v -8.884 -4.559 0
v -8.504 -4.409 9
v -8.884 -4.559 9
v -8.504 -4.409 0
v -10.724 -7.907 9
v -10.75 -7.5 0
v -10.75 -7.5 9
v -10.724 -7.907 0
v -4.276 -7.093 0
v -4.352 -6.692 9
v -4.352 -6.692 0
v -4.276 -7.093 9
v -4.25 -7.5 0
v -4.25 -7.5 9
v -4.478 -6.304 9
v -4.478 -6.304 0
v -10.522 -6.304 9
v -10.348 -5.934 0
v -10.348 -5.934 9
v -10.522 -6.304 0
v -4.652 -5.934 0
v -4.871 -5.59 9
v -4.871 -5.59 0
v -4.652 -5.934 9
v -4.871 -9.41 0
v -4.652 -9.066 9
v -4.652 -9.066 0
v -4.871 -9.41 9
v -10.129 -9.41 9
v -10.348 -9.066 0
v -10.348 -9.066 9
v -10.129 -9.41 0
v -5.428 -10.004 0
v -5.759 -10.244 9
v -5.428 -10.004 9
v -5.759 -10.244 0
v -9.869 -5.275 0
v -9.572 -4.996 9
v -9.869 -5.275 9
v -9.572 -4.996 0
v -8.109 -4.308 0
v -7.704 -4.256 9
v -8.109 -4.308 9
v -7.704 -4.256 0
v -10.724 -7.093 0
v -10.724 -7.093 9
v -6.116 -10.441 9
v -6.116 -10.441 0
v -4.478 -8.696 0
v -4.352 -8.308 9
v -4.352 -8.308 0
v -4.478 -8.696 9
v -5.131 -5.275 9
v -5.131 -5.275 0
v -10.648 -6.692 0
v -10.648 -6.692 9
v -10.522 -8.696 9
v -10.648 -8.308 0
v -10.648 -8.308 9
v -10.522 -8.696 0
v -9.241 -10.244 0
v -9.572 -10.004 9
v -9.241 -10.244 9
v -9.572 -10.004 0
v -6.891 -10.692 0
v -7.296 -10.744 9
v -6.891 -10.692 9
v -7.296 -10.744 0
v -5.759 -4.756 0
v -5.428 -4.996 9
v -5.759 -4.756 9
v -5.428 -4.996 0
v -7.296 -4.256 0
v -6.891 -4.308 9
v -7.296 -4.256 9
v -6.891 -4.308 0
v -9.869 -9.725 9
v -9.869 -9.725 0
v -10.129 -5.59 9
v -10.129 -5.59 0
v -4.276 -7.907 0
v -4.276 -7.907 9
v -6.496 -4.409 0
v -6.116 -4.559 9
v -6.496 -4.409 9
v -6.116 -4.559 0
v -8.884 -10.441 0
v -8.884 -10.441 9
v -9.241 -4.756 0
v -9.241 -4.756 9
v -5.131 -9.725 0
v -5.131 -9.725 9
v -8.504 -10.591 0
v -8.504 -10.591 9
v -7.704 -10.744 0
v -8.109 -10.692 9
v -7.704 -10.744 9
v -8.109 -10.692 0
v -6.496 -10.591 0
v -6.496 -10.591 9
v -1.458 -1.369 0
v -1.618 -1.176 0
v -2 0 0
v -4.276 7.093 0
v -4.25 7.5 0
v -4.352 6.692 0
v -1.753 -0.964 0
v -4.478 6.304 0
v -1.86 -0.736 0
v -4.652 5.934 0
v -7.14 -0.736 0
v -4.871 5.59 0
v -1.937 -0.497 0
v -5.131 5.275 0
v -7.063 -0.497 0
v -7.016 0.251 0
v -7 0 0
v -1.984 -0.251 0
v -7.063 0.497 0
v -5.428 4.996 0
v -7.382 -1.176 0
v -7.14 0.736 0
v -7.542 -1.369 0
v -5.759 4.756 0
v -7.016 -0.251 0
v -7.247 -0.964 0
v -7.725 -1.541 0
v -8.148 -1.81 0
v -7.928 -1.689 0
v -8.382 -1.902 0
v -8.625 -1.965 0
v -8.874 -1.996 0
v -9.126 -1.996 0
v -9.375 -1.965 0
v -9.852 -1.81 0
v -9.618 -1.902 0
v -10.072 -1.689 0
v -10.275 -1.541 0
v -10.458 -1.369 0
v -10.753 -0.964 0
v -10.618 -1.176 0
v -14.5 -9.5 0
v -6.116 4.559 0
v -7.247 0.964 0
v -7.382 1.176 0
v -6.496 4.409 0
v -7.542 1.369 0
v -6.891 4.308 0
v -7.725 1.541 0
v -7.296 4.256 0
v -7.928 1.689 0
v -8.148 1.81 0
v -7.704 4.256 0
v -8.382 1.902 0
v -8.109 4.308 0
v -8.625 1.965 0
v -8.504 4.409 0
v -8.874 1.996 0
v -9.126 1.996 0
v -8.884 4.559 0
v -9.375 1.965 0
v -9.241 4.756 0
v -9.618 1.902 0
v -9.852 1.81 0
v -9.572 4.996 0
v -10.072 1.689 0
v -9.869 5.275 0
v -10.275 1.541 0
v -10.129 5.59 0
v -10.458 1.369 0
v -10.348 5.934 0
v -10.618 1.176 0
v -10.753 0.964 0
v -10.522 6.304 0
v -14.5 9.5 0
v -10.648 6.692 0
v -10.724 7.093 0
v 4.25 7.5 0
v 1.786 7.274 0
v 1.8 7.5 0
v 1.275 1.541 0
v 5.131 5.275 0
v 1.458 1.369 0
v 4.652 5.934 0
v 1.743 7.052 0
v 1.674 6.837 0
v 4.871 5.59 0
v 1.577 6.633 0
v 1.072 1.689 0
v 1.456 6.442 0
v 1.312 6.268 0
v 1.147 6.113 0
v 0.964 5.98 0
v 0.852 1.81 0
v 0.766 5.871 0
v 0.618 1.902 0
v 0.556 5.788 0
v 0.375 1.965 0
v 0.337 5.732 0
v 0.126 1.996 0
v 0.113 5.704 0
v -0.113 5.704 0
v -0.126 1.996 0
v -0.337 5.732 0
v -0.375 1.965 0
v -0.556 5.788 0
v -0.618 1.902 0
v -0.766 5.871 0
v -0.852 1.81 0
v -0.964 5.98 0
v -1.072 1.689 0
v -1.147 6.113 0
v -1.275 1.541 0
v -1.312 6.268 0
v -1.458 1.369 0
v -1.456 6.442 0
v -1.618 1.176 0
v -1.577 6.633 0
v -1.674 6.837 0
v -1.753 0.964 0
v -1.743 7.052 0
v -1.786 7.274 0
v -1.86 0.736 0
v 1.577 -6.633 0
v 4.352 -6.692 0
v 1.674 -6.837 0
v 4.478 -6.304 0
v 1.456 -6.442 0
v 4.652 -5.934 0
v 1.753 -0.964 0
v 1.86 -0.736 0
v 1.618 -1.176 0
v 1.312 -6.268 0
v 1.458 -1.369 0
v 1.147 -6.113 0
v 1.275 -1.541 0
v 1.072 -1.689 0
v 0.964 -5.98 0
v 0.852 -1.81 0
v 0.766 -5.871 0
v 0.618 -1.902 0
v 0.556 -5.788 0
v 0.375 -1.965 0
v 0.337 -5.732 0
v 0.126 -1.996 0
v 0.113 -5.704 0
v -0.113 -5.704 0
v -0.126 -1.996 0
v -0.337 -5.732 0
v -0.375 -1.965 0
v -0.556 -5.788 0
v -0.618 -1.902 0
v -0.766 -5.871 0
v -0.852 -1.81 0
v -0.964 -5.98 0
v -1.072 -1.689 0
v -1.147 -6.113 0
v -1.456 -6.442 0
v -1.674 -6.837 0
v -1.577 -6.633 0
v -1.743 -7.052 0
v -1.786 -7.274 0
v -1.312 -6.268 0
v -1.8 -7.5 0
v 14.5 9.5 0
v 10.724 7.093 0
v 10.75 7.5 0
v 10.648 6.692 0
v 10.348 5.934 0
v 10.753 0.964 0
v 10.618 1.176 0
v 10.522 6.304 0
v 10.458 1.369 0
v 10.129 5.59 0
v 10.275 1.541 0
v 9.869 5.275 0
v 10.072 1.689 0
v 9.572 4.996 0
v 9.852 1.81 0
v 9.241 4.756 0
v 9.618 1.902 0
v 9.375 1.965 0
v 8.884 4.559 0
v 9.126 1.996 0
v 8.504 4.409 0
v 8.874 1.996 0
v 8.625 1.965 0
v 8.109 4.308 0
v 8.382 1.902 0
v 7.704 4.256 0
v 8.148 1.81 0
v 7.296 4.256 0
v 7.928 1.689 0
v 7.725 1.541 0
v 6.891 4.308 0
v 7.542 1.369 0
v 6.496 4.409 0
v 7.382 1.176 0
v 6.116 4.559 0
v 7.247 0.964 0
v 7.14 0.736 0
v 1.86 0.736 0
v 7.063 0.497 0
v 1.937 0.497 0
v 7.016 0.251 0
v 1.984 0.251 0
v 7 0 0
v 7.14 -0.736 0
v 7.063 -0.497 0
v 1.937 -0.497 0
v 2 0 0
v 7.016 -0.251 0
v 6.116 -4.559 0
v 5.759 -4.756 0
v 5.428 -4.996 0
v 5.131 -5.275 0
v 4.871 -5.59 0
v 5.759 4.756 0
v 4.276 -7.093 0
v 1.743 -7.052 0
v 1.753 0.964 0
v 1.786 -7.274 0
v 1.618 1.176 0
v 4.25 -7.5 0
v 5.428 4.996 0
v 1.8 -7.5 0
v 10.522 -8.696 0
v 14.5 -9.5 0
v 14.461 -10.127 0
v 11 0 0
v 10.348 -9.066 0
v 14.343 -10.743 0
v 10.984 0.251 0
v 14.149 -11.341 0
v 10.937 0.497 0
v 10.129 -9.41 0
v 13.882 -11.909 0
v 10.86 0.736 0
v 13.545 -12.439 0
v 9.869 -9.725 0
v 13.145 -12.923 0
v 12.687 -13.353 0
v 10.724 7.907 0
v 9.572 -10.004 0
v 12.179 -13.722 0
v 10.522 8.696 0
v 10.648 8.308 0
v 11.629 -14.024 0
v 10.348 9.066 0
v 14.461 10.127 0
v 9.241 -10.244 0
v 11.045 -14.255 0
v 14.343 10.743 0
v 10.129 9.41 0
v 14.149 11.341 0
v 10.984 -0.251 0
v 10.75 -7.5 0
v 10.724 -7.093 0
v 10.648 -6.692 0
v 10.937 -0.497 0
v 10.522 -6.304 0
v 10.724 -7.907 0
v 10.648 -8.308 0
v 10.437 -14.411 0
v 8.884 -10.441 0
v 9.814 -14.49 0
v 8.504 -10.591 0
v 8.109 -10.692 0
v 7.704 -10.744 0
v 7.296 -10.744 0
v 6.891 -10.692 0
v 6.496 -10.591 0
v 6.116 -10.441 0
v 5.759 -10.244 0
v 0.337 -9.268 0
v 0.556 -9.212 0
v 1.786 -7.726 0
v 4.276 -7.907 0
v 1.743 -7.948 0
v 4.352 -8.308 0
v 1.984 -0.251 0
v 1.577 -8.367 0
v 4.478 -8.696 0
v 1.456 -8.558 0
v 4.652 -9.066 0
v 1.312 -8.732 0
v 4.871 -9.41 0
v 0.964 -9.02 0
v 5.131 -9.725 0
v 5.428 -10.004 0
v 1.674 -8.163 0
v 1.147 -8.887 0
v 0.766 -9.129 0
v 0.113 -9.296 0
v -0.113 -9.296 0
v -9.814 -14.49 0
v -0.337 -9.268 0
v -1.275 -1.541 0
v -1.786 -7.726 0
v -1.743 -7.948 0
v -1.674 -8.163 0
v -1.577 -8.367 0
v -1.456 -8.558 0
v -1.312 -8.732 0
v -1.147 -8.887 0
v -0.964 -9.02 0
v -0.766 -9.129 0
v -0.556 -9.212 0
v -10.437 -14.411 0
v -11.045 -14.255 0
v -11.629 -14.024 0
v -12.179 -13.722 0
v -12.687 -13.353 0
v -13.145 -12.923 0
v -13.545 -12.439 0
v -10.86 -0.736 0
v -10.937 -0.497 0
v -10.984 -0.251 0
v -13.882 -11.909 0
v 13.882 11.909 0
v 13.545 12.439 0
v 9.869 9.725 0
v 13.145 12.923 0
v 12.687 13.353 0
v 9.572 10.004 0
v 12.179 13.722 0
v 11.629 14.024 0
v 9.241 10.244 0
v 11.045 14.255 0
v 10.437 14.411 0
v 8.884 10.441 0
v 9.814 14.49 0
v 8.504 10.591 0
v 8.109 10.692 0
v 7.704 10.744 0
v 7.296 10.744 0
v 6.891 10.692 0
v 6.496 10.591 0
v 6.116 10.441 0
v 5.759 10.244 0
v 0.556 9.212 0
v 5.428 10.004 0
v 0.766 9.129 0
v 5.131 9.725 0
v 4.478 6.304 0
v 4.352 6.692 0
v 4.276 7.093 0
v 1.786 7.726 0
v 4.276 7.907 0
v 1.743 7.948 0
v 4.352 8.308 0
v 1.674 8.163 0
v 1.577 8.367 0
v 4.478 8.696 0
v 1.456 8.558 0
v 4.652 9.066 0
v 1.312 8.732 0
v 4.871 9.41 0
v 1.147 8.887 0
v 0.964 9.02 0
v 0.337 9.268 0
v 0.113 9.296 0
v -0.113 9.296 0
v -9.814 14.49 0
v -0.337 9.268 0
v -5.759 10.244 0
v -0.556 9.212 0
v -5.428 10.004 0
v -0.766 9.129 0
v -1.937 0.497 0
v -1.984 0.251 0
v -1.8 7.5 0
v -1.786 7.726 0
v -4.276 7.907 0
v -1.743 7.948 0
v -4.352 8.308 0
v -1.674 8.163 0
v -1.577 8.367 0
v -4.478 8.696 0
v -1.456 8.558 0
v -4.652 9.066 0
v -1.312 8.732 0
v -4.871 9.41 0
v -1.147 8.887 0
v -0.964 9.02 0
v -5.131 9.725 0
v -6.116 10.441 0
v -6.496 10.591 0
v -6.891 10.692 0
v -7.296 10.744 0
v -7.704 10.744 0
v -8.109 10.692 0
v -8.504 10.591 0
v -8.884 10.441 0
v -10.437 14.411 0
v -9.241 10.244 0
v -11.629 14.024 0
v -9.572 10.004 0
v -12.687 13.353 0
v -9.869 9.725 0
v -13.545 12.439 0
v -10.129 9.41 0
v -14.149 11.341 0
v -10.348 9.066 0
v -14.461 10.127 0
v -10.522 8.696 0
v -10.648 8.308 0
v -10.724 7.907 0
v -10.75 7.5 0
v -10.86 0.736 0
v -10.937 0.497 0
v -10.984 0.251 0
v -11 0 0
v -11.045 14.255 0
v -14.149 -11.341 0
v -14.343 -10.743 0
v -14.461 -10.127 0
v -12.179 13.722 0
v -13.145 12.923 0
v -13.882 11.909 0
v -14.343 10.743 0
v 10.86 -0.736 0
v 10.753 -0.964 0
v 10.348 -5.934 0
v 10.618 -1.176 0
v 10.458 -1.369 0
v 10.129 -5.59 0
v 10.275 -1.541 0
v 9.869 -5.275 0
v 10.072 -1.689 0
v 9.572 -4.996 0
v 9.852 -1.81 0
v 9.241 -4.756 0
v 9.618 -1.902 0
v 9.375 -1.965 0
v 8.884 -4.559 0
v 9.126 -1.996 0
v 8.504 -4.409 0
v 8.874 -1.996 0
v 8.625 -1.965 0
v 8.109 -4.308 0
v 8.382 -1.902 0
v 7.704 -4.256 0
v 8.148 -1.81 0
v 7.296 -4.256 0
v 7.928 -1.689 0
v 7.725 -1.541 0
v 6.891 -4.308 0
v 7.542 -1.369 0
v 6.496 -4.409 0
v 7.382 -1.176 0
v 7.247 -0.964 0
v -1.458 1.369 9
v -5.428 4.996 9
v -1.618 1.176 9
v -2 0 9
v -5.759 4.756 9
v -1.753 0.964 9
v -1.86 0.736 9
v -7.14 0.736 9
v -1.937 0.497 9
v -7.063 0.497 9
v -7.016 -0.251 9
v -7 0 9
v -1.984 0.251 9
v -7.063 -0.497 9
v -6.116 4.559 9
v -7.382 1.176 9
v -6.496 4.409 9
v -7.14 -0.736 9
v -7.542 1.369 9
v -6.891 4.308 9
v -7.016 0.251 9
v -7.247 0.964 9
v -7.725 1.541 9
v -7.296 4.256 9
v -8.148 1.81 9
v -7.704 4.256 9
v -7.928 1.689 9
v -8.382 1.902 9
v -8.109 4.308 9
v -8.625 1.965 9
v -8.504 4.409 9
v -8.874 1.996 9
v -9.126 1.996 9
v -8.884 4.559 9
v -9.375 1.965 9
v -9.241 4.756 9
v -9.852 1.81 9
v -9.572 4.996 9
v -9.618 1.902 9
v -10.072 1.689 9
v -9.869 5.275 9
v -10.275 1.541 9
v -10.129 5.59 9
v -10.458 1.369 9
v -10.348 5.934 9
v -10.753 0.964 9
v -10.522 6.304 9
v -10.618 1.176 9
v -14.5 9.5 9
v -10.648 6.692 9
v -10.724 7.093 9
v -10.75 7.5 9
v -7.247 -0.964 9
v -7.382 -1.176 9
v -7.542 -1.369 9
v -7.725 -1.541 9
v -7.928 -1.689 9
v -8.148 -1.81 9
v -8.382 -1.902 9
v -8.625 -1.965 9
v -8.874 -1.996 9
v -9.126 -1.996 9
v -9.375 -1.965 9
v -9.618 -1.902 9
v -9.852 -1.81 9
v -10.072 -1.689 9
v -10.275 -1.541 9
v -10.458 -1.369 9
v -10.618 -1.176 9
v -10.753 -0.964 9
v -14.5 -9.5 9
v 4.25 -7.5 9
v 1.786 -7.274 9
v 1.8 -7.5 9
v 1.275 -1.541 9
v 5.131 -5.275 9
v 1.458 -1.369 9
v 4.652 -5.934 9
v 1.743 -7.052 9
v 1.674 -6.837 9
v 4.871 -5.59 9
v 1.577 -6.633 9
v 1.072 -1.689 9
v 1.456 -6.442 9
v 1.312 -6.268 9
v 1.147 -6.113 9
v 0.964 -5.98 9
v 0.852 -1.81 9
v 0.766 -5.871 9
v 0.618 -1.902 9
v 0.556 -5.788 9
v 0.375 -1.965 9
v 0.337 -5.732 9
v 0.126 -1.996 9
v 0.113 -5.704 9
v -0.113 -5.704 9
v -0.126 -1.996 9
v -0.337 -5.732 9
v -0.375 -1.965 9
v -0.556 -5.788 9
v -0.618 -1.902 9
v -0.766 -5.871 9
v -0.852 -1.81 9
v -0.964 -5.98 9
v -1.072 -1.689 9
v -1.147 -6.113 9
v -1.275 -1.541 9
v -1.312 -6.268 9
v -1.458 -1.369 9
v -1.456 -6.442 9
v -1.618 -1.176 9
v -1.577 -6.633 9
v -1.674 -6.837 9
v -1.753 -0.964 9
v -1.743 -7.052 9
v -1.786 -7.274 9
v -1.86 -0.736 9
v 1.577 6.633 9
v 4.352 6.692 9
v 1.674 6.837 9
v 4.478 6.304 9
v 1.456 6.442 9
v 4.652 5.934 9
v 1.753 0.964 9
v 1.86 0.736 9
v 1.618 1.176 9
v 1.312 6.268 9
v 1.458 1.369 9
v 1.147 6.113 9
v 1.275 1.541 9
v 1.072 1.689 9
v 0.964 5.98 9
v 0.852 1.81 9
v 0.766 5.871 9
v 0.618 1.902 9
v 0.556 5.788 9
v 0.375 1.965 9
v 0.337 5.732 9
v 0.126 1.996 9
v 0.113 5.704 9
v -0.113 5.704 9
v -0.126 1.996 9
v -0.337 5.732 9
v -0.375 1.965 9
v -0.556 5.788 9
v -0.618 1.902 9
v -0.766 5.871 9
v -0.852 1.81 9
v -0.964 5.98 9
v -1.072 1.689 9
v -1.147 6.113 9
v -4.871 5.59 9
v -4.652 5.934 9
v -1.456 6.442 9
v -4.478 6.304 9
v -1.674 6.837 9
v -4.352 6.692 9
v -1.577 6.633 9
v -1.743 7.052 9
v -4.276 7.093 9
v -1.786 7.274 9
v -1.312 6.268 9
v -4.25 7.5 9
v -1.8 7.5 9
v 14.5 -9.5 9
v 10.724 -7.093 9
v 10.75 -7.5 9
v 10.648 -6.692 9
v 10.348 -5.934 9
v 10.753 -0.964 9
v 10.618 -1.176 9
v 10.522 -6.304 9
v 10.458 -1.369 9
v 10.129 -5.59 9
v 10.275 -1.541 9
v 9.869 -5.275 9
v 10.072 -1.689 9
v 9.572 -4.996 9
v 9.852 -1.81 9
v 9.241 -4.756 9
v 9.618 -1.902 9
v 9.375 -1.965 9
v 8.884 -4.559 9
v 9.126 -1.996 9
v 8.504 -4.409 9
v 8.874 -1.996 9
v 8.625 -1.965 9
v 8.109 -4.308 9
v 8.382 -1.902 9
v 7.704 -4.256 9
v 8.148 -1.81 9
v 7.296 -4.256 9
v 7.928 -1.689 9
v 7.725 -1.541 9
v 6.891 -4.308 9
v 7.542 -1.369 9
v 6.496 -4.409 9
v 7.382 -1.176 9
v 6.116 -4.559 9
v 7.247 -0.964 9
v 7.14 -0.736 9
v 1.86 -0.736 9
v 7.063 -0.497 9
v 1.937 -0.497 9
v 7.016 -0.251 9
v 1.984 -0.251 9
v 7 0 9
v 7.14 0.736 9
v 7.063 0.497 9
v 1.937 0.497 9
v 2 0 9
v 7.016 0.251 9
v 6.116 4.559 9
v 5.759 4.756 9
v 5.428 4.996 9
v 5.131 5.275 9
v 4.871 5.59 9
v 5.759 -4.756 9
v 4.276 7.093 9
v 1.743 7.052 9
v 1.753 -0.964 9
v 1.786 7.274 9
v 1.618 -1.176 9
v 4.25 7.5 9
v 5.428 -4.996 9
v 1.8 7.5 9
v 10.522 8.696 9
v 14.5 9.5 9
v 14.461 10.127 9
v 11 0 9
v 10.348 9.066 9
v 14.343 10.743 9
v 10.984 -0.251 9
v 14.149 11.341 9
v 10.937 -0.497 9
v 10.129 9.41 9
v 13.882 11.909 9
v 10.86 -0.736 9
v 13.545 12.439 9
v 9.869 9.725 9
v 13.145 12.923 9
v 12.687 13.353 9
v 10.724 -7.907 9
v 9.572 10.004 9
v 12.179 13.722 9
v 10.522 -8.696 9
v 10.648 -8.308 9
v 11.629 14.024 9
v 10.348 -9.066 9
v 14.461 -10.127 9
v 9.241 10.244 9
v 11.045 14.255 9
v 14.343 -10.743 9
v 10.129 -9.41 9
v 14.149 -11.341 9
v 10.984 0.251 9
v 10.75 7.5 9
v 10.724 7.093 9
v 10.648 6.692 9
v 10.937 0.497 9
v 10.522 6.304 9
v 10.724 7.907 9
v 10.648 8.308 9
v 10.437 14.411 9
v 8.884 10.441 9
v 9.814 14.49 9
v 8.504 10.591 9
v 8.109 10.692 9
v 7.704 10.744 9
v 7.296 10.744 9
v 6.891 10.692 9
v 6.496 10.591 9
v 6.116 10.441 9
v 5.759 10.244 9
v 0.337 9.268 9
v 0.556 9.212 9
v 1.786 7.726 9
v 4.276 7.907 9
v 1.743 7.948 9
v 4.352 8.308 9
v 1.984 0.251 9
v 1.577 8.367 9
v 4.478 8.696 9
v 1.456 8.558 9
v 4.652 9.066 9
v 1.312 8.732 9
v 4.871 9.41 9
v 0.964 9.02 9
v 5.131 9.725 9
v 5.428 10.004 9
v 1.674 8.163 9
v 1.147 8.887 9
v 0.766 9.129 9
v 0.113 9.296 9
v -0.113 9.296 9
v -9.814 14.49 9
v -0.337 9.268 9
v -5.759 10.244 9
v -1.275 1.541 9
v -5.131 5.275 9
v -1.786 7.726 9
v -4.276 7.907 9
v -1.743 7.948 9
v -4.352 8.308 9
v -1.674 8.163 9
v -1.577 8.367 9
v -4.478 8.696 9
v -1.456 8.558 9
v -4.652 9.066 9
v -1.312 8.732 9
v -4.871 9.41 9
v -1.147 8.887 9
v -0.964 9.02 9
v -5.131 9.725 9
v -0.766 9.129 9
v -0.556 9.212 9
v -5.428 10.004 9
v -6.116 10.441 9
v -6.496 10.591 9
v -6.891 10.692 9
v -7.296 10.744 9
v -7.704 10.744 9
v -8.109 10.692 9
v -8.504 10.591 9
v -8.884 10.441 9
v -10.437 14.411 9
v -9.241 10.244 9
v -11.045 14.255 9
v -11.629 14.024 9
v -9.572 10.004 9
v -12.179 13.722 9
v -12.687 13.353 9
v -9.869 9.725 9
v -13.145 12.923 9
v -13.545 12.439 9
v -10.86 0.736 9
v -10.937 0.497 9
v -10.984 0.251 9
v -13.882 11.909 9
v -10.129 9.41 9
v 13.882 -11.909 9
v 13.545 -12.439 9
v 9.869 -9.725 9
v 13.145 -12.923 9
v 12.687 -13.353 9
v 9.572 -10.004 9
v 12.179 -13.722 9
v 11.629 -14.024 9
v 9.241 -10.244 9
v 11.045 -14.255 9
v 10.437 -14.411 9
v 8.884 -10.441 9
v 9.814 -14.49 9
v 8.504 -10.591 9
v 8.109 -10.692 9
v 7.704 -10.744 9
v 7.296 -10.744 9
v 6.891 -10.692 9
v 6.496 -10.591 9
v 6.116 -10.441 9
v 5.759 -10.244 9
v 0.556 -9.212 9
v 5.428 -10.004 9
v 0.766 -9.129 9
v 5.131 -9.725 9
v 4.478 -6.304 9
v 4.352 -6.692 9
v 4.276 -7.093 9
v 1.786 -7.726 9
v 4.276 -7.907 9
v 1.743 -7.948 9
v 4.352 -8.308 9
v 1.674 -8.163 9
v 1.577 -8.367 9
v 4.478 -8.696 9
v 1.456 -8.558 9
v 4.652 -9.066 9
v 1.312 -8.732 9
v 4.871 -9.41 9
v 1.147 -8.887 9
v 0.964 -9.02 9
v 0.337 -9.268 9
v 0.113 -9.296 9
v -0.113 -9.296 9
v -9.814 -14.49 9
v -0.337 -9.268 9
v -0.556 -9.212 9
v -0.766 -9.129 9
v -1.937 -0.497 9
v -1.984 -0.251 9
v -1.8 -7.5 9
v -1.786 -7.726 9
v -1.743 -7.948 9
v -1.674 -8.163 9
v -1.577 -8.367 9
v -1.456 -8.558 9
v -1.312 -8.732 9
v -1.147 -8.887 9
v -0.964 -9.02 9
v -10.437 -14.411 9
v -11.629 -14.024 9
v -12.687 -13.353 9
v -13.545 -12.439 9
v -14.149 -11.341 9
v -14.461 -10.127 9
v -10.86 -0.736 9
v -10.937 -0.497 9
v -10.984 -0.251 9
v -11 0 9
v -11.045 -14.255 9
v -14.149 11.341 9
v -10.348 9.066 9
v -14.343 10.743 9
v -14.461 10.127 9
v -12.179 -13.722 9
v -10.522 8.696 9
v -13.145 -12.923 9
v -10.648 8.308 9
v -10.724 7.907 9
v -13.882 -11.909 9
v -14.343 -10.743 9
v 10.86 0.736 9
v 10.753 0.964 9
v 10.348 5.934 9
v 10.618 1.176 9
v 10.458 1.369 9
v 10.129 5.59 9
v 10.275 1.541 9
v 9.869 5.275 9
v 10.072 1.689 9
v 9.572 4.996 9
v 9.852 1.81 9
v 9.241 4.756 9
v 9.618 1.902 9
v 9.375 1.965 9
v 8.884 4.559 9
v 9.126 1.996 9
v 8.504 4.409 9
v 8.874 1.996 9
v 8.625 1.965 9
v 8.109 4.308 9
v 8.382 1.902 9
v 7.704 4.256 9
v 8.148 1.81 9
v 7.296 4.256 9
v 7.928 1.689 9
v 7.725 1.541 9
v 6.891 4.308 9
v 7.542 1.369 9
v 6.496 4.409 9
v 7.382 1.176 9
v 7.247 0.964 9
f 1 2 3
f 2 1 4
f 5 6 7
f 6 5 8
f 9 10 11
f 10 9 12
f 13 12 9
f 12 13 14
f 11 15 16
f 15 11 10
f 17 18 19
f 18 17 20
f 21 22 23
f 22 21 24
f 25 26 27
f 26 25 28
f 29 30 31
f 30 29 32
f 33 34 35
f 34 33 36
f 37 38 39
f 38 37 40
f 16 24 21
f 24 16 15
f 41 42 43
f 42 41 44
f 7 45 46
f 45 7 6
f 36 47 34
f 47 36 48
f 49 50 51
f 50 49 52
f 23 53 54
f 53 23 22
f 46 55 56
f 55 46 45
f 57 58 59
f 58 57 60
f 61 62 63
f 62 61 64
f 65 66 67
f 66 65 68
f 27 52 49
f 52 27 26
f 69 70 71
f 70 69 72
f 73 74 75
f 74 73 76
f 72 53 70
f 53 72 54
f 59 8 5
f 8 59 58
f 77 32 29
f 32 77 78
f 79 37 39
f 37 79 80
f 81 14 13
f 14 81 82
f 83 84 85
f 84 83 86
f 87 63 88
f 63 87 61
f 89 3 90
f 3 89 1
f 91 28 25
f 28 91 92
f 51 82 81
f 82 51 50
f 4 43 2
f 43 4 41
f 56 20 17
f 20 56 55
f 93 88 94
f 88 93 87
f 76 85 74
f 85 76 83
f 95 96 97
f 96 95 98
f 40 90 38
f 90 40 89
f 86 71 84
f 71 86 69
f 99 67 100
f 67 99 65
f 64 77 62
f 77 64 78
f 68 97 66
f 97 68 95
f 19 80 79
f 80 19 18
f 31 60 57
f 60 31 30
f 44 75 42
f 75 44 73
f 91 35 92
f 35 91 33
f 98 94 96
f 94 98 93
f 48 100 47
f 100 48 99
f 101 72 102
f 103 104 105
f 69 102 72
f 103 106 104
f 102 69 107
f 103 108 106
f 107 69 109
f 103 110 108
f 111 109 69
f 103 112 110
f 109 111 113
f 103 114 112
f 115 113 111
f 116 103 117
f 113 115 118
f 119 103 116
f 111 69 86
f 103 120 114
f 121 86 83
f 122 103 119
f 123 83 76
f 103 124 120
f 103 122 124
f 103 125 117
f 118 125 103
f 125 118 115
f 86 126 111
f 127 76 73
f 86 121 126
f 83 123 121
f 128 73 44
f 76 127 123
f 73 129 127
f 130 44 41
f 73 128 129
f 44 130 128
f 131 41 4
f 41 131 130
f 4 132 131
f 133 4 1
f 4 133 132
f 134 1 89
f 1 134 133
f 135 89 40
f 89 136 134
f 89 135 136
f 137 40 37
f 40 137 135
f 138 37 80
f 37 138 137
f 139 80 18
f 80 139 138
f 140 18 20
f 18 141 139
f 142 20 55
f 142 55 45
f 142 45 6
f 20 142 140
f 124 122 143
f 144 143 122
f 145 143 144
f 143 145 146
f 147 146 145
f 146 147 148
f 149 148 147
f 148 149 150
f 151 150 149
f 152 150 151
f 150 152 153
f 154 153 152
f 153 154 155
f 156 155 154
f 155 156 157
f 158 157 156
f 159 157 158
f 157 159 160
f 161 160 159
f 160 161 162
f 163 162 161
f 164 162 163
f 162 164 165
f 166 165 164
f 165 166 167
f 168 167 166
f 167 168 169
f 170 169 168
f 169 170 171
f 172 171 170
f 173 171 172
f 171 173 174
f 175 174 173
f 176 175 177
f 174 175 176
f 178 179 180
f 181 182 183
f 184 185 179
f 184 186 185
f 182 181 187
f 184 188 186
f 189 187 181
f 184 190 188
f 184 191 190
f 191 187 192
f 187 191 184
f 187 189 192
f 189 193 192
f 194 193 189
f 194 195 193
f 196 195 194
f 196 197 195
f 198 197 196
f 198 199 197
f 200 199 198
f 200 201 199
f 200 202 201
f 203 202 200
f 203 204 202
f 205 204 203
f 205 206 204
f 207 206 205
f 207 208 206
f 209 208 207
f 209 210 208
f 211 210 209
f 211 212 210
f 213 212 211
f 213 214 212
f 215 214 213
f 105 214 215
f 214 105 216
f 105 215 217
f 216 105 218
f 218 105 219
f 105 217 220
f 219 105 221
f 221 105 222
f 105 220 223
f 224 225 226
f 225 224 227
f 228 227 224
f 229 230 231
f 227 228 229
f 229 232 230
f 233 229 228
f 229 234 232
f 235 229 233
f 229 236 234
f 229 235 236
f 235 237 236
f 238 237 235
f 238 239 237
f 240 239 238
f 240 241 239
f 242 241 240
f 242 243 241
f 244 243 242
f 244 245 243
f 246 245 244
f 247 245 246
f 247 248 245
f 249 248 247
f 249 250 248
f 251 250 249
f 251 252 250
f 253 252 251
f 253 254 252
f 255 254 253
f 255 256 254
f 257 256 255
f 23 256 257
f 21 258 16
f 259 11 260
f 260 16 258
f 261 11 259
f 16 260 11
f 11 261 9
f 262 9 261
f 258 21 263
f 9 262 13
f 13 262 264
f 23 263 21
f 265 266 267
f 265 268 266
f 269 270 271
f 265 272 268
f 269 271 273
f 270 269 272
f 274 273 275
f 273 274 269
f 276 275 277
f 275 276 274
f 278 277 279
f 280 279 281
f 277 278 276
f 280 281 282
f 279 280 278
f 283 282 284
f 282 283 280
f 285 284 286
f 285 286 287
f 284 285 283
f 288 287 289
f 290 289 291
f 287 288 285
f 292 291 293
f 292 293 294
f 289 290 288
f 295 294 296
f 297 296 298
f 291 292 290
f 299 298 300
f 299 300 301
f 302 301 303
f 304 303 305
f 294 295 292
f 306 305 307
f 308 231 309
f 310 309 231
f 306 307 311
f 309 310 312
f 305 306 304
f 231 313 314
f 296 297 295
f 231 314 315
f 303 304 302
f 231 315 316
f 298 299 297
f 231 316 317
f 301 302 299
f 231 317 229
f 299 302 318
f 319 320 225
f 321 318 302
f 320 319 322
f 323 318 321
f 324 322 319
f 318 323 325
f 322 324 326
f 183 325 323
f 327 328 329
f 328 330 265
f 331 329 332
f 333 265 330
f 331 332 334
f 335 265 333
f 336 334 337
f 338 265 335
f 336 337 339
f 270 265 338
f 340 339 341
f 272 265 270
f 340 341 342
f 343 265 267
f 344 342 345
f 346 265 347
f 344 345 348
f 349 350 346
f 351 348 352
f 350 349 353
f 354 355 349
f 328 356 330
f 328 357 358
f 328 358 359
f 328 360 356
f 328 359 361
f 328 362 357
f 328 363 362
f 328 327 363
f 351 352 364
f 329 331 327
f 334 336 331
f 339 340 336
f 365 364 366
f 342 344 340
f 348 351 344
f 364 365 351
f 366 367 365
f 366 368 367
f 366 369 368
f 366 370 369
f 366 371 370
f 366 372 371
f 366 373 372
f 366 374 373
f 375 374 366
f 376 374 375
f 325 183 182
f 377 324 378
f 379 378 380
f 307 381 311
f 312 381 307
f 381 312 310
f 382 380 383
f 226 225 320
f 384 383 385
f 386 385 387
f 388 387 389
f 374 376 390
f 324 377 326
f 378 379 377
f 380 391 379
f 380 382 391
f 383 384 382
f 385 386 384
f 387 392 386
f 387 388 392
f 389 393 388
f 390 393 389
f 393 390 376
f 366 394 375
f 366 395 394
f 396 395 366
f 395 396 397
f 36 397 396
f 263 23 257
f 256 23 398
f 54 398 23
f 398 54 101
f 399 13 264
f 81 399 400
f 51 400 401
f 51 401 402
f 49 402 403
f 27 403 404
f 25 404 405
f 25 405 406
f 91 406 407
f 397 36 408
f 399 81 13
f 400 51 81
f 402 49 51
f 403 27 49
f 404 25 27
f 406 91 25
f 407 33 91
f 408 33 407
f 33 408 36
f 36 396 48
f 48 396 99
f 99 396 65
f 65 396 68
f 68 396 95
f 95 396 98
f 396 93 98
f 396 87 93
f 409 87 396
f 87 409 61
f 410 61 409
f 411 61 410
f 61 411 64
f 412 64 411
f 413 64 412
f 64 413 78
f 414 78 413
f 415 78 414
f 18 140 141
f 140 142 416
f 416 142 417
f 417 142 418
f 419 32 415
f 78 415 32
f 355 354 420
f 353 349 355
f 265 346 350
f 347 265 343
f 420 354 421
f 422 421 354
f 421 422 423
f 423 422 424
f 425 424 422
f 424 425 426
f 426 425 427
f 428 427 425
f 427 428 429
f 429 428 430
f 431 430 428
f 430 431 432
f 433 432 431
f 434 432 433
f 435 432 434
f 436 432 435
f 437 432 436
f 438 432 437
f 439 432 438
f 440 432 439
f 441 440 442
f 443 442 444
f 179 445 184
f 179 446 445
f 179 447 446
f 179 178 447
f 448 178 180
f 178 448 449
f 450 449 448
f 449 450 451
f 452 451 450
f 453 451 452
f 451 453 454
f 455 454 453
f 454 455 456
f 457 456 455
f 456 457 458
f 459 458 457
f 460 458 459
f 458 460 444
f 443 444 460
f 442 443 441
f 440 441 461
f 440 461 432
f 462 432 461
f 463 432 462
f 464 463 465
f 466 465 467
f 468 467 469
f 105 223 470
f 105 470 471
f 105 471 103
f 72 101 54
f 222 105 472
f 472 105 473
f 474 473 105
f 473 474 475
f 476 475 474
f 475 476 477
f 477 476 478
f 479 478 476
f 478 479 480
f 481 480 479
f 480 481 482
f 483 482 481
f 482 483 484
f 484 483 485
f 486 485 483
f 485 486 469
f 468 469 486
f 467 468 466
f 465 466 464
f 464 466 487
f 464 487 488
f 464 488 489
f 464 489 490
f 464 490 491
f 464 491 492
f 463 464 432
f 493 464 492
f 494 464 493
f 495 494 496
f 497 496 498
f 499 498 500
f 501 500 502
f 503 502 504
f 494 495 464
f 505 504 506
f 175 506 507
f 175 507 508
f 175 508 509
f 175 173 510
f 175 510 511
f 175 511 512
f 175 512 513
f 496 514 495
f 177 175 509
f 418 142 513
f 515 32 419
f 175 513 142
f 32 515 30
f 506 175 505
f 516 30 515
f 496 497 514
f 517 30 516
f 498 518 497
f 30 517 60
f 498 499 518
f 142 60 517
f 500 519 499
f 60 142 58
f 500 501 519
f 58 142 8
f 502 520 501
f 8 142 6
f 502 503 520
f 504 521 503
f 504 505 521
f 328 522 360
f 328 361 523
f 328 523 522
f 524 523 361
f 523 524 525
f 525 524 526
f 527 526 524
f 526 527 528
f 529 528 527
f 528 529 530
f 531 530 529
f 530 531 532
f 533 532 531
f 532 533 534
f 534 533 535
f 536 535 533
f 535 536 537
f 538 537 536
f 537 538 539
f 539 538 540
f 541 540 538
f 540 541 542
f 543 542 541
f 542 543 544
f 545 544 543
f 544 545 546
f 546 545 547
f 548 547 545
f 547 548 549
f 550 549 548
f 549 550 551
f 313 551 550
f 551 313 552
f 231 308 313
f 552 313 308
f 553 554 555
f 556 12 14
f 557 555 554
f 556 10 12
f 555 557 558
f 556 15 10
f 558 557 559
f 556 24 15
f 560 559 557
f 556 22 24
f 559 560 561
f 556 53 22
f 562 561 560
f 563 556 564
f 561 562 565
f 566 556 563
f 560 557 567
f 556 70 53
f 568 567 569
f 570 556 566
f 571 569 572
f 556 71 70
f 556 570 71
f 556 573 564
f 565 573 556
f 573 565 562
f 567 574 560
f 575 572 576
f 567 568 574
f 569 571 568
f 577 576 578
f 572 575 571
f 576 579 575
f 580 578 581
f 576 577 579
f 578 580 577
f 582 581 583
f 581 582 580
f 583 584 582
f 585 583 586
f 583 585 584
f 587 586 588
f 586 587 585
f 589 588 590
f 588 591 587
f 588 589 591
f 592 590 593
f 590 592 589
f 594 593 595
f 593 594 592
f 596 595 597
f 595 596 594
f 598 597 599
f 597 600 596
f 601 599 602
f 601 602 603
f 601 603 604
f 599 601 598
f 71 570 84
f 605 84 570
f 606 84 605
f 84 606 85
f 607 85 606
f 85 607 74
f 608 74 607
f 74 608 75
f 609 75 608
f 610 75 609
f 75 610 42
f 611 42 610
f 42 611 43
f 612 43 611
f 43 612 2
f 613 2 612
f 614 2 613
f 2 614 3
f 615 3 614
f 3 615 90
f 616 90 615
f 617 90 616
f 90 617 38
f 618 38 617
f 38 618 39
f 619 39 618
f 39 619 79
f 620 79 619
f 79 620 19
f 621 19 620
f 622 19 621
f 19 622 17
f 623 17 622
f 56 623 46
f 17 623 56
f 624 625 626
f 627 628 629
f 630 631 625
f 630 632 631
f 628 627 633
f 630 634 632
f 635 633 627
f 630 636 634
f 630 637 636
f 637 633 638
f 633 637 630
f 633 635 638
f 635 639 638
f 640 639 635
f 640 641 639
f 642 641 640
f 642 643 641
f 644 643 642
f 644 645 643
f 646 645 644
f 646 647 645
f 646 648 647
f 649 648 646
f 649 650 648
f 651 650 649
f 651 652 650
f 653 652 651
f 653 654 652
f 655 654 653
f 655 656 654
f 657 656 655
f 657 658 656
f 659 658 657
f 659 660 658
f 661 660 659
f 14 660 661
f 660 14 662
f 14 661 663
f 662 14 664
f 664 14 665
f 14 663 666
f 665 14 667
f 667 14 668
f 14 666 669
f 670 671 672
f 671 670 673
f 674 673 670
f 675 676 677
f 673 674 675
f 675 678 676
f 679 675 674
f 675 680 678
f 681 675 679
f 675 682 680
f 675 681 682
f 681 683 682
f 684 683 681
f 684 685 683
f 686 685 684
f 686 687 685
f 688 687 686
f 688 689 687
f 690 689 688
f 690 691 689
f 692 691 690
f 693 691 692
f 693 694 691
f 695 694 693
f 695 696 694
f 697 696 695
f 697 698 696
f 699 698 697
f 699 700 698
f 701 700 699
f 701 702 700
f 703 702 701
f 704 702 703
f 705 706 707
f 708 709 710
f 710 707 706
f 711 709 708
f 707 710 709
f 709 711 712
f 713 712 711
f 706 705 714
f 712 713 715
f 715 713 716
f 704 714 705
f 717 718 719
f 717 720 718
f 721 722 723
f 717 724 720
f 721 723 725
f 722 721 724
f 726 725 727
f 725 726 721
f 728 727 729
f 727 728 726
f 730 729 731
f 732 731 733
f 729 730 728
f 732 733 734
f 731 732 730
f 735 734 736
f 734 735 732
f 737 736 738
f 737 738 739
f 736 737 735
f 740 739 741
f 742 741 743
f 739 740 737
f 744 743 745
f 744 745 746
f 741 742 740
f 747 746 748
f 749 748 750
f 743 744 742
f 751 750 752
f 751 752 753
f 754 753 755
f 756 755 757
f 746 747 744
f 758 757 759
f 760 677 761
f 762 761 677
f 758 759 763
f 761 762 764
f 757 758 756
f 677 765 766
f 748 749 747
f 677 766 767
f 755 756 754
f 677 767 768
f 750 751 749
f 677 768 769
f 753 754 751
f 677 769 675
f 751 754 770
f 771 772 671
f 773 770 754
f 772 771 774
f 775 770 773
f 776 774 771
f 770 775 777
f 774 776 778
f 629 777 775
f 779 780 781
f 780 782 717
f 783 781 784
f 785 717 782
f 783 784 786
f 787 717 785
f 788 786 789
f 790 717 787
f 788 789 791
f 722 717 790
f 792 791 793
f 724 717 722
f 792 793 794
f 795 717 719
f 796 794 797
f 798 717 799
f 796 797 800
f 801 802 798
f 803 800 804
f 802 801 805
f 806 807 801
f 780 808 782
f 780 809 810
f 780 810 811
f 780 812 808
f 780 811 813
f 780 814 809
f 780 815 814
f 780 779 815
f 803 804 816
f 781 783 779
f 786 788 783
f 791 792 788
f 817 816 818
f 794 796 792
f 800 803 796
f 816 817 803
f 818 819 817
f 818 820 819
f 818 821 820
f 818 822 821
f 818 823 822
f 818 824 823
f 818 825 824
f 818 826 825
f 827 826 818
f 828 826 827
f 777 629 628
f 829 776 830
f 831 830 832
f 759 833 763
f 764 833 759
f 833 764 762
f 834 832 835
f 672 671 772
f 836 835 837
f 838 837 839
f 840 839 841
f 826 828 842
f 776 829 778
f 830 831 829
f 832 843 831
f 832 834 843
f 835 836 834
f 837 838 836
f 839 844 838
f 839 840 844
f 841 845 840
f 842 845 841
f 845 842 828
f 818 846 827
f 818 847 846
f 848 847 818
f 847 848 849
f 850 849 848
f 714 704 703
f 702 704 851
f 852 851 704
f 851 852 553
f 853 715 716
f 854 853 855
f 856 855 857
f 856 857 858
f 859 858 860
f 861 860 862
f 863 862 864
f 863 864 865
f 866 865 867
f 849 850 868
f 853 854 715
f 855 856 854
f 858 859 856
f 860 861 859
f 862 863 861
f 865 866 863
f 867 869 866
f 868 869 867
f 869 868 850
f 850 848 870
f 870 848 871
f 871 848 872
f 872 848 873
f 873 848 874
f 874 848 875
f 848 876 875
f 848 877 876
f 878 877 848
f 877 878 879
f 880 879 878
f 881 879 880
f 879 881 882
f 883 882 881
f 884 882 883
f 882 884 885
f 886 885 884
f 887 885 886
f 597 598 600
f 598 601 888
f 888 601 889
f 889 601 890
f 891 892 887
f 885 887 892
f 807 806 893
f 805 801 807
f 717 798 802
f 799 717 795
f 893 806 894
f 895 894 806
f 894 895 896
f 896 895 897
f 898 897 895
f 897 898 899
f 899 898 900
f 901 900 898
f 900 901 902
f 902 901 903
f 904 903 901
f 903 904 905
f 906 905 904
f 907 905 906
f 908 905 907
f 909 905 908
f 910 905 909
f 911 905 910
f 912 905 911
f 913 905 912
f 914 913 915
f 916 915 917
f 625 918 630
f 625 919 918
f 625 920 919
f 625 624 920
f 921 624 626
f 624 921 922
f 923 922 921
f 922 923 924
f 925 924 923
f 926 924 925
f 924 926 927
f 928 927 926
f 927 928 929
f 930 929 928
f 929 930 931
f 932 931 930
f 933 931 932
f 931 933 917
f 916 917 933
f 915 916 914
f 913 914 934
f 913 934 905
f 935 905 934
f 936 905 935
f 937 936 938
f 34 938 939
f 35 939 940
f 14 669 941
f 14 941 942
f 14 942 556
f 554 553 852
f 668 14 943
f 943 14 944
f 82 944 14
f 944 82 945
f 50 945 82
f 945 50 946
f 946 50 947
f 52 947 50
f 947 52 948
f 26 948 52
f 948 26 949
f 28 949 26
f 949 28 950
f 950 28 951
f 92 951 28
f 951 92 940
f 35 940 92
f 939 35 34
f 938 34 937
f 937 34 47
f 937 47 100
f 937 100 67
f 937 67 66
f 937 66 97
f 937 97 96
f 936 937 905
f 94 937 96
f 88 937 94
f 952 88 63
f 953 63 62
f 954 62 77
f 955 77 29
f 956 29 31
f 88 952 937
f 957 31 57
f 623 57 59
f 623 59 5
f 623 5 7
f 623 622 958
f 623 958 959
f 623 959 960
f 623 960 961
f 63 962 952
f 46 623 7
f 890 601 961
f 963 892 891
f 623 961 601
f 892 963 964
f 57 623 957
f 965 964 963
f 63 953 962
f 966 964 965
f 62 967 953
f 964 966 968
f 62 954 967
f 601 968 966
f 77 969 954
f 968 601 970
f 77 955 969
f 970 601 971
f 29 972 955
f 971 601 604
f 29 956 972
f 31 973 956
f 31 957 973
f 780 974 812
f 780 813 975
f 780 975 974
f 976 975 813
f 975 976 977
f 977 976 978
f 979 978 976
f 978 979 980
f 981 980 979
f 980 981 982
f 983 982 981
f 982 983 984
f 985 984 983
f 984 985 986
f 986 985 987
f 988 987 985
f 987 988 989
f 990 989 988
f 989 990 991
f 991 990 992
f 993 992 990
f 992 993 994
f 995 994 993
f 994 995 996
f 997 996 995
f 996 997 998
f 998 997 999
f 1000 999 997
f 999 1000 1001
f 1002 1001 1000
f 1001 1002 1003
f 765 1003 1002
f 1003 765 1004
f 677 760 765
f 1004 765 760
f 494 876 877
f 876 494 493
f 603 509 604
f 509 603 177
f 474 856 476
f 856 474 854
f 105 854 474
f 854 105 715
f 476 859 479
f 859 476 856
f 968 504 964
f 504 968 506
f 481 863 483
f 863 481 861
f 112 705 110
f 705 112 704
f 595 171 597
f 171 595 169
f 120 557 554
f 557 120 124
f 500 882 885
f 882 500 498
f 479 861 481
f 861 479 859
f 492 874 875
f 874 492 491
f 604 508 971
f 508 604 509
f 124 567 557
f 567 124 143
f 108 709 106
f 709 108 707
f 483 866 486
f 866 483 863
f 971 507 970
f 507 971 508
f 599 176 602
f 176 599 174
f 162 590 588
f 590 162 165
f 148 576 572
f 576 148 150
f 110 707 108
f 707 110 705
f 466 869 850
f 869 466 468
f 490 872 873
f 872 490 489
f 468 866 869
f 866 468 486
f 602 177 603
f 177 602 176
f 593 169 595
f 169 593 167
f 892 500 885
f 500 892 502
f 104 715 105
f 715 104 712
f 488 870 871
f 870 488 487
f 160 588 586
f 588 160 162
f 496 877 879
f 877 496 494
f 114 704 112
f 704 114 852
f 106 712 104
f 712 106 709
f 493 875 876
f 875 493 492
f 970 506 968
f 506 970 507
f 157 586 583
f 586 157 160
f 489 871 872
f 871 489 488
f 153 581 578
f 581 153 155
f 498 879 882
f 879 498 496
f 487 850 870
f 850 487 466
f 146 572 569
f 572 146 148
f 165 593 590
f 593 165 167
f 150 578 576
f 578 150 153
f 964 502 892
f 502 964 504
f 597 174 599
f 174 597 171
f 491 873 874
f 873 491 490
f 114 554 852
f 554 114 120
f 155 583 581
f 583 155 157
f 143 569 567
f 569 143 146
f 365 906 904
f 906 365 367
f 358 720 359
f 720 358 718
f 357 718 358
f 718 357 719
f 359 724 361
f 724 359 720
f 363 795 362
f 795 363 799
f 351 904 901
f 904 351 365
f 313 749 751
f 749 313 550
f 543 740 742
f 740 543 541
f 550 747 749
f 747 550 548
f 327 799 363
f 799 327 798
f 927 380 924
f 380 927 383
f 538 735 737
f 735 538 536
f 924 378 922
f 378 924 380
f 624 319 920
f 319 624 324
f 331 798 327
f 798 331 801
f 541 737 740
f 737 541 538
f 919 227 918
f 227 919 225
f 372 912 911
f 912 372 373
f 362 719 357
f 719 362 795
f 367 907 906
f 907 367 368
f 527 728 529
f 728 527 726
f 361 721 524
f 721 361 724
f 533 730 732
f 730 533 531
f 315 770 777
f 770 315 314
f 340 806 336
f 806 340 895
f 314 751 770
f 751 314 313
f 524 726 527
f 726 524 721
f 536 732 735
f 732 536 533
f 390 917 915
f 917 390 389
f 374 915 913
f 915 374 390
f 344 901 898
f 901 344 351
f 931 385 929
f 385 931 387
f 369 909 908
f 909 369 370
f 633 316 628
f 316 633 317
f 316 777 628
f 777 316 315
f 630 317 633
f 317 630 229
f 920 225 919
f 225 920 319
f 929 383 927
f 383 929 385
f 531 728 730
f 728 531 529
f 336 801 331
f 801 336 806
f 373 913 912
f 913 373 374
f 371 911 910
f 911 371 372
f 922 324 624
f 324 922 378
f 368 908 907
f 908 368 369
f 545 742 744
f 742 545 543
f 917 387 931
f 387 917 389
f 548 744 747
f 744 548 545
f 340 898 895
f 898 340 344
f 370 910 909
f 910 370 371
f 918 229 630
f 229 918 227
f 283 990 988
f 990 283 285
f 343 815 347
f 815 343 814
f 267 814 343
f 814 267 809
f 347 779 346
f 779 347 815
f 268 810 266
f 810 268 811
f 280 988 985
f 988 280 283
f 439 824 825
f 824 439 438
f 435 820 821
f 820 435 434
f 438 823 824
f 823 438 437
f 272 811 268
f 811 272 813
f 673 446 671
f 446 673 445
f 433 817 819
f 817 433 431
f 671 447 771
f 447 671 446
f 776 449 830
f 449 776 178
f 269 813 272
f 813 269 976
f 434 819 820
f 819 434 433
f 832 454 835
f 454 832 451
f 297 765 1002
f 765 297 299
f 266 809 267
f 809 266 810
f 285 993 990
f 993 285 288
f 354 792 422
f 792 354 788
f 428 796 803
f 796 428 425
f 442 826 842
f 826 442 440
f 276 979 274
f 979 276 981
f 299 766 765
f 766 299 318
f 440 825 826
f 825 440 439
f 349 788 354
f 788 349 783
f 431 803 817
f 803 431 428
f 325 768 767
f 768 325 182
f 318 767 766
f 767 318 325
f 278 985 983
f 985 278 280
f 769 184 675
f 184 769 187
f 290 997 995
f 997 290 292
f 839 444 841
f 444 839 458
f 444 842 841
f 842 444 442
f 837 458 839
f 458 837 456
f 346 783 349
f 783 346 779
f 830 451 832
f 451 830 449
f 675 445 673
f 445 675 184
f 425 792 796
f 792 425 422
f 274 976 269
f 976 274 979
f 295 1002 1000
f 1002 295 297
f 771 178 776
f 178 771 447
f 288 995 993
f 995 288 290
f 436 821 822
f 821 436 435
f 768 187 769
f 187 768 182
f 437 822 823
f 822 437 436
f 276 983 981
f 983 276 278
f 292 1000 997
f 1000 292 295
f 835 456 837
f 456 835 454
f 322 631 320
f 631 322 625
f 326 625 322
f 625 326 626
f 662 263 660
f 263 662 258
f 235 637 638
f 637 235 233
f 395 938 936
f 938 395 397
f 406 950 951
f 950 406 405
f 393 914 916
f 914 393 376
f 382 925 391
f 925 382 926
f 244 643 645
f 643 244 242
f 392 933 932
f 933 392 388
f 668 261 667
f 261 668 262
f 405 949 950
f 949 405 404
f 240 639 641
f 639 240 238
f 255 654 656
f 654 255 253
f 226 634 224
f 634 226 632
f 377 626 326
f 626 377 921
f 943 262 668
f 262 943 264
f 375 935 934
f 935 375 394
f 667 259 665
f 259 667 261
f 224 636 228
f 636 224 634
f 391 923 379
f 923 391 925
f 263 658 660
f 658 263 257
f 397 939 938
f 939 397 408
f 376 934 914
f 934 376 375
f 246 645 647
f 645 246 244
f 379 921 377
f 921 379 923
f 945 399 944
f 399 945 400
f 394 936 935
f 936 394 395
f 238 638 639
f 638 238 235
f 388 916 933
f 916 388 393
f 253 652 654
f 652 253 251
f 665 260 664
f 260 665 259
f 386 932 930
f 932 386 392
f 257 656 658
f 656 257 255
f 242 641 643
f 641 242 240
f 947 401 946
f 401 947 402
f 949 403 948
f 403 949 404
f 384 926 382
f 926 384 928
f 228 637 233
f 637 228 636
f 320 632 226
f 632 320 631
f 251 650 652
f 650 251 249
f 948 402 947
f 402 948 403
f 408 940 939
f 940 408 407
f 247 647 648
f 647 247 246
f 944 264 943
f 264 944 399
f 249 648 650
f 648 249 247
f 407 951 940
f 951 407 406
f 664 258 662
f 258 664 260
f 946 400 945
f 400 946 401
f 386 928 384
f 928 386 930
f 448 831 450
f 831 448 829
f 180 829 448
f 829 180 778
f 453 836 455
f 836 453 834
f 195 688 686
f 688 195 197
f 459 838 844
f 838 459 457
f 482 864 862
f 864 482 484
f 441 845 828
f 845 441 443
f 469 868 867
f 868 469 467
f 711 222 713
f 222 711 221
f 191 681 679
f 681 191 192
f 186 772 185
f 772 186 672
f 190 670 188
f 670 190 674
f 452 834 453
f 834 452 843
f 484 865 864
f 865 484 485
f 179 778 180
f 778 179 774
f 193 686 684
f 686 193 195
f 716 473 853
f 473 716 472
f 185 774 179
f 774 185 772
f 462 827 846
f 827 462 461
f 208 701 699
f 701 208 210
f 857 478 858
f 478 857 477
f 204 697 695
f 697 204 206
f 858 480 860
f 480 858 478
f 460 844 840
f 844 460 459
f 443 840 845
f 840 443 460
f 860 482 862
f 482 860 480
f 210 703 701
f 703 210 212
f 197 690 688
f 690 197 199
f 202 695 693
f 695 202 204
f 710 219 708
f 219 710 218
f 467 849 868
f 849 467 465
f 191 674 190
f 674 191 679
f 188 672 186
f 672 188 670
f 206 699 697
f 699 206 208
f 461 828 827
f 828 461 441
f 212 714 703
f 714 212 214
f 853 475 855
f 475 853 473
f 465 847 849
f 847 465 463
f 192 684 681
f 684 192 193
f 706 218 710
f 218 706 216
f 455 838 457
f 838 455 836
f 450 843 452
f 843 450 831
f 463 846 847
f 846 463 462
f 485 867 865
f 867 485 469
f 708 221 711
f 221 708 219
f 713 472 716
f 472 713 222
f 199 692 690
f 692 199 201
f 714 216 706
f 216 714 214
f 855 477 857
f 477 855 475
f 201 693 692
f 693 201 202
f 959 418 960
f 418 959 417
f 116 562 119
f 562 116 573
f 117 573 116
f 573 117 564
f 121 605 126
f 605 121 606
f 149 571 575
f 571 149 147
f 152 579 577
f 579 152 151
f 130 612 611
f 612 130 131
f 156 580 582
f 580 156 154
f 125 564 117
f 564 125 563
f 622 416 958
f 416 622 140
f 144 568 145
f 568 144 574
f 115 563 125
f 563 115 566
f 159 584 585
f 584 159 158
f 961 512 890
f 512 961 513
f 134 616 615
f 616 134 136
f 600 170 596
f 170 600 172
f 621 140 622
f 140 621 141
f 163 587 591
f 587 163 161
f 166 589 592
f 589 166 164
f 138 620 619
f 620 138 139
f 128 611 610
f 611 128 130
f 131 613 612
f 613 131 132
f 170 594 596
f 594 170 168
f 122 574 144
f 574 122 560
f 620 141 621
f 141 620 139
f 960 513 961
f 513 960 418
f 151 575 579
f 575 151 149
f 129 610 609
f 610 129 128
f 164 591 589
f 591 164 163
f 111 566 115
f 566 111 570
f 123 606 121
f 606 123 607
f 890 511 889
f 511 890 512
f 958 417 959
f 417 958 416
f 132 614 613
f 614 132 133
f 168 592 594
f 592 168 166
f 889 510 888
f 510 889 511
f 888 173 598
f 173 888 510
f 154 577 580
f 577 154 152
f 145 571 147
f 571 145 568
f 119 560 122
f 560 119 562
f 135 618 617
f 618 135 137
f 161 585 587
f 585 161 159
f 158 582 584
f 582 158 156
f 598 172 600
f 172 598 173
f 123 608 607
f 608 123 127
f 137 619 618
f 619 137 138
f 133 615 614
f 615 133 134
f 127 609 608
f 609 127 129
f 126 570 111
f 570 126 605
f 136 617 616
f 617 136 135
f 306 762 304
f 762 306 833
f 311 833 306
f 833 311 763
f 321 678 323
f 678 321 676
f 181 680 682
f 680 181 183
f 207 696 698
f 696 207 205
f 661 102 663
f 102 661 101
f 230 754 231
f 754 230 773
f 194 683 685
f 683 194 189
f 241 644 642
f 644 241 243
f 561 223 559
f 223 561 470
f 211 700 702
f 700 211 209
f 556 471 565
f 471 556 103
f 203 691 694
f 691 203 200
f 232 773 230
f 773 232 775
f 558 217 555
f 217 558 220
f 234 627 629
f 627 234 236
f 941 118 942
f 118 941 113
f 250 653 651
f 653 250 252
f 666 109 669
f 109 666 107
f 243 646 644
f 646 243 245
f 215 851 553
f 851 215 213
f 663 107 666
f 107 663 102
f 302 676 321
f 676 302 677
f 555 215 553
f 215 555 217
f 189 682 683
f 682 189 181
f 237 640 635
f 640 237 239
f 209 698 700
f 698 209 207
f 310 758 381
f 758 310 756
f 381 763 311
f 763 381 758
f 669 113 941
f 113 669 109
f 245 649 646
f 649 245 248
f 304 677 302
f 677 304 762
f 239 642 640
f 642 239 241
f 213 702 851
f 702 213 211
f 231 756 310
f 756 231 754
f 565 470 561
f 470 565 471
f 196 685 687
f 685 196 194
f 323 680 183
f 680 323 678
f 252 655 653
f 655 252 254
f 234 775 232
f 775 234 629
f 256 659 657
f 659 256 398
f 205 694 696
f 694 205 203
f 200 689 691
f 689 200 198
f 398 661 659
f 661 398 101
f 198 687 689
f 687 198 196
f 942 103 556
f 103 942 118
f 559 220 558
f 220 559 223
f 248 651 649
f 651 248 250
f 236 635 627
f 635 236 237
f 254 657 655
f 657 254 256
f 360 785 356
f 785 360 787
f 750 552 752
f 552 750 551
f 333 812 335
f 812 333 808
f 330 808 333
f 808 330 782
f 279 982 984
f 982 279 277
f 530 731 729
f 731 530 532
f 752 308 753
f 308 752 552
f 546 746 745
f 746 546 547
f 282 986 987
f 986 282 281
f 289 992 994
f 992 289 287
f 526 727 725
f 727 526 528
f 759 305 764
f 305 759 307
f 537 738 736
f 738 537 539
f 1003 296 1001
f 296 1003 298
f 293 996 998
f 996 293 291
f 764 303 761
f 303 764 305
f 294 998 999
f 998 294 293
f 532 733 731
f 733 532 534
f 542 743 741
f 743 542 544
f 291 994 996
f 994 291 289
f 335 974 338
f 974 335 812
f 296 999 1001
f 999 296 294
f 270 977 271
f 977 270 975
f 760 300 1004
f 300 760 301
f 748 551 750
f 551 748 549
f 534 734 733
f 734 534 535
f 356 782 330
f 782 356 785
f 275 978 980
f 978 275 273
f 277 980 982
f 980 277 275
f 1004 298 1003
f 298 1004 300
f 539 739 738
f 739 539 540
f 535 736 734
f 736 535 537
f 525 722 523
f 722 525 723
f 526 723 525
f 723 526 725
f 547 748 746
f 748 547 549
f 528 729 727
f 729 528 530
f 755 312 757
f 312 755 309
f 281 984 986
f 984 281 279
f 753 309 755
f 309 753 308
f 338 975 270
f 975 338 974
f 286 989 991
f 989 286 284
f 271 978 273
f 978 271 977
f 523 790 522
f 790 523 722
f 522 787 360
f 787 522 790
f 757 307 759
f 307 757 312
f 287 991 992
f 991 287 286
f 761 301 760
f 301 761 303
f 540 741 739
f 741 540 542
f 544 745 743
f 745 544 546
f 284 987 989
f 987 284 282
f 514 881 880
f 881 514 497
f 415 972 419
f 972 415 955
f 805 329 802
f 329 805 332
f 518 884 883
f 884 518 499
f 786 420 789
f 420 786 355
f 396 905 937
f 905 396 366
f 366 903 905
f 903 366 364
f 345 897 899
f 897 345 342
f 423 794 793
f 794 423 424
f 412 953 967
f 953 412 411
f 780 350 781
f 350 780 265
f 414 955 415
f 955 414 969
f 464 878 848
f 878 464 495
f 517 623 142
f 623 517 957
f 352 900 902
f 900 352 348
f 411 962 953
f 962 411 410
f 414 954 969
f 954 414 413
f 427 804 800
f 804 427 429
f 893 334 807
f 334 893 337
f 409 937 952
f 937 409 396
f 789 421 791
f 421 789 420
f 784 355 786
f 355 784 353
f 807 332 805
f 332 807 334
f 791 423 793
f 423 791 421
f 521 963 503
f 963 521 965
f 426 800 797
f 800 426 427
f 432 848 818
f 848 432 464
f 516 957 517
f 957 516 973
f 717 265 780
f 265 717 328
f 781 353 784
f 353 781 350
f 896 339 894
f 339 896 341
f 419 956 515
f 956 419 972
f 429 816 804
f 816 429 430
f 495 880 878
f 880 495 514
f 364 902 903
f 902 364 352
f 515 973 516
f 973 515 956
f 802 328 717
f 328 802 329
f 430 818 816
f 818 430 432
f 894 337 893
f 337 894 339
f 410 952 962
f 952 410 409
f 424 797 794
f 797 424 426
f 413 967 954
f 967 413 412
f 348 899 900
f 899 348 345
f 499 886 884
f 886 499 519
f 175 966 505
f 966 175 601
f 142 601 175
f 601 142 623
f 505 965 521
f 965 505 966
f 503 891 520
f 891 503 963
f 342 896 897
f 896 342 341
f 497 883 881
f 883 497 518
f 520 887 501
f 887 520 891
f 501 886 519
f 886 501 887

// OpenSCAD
$fn = 50;

difference() {
	union() {
		hull() {
			translate(v = [-9.5, 9.5, 0]) {
				cylinder(h = 9, r = 5);
			}
			translate(v = [9.5, 9.5, 0]) {
				cylinder(h = 9, r = 5);
			}
			translate(v = [-9.5, -9.5, 0]) {
				cylinder(h = 9, r = 5);
			}
			translate(v = [9.5, -9.5, 0]) {
				cylinder(h = 9, r = 5);
			}
		}
	}
	union() {
		translate(v = [-7.5, -7.5, 0]) {
			cylinder(h = 9, r = 3.25);
		}
		translate(v = [-7.5, 7.5, 0]) {
			cylinder(h = 9, r = 3.25);
		}
		translate(v = [7.5, -7.5, 0]) {
			cylinder(h = 9, r = 3.25);
		}
		translate(v = [7.5, 7.5, 0]) {
			cylinder(h = 9, r = 3.25);
		}
		translate(v = [0.0, -7.5, 0]) {
			cylinder(h = 9, r = 1.8);
		}
		translate(v = [0.0, 7.5, 0]) {
			cylinder(h = 9, r = 1.8);
		}
		translate(v = [-9.0, 0, 0.0]) {
			cylinder(h = 9, r = 2.0);
		}
		cylinder(h = 9, r = 2.0);
		translate(v = [9.0, 0, 0.0]) {
			cylinder(h = 9, r = 2.0);
		}
	}
}
